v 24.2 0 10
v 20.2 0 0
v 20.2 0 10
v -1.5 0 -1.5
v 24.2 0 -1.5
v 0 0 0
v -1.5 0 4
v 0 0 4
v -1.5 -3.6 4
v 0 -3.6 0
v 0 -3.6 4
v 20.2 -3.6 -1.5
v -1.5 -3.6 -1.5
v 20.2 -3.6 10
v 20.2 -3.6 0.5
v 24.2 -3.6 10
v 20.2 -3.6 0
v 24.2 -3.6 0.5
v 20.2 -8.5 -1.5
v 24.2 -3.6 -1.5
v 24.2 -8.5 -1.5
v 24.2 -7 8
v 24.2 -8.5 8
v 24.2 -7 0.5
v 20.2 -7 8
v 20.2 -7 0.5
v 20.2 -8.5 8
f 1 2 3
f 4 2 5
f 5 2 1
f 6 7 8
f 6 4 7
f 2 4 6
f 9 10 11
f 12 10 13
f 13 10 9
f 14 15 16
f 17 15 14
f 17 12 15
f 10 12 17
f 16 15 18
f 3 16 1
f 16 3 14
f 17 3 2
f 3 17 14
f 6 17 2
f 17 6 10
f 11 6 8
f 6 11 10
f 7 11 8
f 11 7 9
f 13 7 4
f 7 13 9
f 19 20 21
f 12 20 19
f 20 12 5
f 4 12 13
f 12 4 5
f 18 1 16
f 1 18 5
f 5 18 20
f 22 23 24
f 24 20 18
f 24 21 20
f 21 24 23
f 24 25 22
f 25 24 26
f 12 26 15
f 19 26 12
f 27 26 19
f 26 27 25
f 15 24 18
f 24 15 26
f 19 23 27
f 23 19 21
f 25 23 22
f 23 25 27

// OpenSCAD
lh=0.2;
lw=0.4;

v_space=3.6;
h_space=4;
h_gap=3.3;
column_w=20.2;
wall=1.5;

rotate([90,0,0]) union() {
  linear_extrude(v_space)
    polygon([
        [0,0],
        [0,h_space],
        [-wall,h_space],
        [-wall,-wall],
        [column_w+h_space,-wall],
        [column_w+h_space,10],
        [column_w,10],
        [column_w,0],
    ]);
  translate([column_w,-wall,v_space]) cube([h_space,2,ceil(h_gap/lh)*lh]);
  translate([column_w,-wall,v_space+ceil(h_gap/lh)*lh]) cube([h_space,wall+8,wall]);
}
